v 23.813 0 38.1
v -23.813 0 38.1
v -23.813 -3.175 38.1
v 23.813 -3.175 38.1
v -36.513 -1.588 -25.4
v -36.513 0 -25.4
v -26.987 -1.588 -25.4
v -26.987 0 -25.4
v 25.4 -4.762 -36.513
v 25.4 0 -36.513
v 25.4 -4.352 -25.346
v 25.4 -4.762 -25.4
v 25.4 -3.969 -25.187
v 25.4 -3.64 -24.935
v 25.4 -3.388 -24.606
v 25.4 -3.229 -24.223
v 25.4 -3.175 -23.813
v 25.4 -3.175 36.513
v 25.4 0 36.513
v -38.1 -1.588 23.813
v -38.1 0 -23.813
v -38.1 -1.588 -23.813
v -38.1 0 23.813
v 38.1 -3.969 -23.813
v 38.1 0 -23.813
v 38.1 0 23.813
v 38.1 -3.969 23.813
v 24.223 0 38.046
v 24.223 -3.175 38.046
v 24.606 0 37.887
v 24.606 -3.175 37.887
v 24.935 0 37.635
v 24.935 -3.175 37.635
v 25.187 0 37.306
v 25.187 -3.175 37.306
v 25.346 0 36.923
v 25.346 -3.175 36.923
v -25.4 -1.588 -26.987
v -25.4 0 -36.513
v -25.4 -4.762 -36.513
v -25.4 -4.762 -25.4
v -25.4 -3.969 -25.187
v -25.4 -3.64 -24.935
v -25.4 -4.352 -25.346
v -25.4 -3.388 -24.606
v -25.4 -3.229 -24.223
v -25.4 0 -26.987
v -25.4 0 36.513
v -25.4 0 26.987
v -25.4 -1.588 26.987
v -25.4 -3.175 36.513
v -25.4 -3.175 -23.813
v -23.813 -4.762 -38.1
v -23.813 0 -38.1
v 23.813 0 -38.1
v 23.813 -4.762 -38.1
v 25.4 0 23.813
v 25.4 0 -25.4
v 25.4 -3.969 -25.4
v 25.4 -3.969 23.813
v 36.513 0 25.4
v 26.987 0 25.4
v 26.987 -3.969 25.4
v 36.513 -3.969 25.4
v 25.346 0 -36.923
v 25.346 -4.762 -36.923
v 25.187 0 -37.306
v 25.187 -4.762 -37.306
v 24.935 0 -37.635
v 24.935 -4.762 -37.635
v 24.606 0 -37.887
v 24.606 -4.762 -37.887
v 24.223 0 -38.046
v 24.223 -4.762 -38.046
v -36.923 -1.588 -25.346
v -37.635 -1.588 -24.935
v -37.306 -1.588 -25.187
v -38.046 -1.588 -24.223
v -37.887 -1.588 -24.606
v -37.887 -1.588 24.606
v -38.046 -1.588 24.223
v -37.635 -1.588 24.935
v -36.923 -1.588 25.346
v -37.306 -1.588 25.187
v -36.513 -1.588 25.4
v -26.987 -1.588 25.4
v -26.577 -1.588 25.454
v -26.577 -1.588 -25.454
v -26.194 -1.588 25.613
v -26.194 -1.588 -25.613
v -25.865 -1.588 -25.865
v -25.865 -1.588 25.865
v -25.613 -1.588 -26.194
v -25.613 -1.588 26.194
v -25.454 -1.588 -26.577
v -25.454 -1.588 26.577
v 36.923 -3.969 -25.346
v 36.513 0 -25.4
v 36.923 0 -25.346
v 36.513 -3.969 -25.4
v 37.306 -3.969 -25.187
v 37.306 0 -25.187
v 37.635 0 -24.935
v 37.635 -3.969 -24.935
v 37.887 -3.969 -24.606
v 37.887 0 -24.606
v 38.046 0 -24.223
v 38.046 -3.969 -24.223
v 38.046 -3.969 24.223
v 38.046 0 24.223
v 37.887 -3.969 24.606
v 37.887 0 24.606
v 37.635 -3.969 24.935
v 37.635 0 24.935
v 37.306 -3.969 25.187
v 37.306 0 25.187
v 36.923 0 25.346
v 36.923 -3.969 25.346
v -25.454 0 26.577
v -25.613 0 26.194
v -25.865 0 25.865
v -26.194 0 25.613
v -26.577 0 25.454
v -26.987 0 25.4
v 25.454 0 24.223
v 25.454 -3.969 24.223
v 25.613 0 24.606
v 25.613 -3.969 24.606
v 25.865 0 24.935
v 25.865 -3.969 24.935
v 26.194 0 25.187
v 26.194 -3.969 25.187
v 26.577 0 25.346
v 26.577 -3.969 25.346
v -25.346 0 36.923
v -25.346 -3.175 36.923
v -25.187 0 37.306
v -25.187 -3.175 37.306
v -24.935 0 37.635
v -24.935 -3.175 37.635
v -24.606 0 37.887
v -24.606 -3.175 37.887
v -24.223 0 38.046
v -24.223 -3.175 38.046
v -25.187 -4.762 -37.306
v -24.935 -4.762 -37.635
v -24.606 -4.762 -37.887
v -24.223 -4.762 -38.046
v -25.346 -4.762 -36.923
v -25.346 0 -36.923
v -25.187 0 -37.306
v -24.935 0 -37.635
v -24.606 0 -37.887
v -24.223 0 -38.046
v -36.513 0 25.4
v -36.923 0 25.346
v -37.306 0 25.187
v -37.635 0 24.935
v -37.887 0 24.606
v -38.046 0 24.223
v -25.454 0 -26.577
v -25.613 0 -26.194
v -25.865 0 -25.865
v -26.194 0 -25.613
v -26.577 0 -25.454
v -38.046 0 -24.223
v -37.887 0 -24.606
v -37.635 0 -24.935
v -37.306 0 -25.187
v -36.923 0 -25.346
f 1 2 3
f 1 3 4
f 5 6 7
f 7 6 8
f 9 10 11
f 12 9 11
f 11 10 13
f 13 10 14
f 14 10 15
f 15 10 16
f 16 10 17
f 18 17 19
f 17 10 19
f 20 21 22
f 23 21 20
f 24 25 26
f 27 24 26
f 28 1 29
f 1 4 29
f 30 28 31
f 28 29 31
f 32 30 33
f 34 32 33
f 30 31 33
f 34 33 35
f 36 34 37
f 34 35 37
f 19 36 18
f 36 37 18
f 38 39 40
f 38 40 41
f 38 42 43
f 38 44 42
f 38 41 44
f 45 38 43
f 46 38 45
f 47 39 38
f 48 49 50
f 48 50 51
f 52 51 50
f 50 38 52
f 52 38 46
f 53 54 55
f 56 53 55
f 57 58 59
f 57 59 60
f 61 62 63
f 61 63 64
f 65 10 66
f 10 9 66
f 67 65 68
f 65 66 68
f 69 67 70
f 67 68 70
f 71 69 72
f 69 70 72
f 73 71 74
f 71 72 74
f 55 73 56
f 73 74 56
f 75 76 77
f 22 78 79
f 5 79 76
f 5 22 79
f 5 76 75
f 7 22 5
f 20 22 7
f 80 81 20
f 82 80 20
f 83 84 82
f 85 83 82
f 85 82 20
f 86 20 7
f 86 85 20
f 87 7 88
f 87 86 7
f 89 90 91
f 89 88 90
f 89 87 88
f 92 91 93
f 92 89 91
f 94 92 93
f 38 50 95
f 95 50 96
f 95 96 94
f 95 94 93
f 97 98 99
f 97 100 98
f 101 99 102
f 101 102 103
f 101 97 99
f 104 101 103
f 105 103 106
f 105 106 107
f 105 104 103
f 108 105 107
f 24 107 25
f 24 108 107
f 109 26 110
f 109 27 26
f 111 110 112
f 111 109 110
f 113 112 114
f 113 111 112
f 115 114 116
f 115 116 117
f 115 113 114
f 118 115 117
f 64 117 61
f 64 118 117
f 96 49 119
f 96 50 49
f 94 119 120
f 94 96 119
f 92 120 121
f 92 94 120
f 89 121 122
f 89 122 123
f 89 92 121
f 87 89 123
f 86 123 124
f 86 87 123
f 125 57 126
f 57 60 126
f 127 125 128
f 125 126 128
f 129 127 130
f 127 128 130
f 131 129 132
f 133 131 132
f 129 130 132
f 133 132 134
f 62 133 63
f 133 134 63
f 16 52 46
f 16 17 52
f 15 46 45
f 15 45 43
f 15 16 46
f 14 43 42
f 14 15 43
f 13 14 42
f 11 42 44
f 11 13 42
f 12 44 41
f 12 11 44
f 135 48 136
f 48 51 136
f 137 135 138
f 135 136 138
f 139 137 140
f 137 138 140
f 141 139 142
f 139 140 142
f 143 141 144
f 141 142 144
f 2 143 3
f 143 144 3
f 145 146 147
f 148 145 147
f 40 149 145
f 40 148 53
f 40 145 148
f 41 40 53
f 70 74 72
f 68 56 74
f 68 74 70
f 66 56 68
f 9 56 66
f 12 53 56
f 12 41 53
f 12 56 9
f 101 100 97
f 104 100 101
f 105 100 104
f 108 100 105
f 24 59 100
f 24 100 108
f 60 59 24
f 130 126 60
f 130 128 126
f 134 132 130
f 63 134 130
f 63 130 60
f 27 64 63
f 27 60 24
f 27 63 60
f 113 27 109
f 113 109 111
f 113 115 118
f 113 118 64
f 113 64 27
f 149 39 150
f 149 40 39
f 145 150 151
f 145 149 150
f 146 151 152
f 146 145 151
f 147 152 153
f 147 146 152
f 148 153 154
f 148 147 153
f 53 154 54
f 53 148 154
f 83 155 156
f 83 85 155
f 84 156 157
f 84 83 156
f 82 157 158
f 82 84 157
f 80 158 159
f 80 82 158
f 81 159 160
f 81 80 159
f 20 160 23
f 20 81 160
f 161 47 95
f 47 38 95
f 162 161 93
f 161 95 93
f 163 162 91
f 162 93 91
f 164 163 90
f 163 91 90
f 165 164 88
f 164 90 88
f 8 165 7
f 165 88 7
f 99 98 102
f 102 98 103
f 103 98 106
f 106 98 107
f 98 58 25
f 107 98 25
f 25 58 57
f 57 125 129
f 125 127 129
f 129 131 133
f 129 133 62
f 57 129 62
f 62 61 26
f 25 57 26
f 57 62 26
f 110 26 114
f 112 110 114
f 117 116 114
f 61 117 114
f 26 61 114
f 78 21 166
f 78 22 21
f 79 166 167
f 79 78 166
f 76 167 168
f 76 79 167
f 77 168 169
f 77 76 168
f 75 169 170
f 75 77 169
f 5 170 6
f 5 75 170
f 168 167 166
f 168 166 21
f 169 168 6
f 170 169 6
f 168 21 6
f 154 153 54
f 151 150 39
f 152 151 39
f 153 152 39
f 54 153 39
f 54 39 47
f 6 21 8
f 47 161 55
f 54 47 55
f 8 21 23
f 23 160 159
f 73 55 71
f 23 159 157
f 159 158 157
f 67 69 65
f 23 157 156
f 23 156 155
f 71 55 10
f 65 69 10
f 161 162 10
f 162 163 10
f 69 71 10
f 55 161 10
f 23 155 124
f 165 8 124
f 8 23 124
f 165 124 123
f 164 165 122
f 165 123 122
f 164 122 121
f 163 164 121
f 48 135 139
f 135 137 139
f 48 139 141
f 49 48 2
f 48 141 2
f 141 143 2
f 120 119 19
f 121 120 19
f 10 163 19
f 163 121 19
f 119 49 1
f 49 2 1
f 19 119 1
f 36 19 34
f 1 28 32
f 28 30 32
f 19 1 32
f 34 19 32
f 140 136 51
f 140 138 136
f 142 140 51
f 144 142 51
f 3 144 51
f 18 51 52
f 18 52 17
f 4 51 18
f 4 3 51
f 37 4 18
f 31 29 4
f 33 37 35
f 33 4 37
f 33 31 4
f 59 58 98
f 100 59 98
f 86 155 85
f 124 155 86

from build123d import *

# Parameters (mm, degrees)
F0_W     = 50.8
F0_H     = 12.7
F1_DEPTH = 3.175
F0_W_2   = 12.7
F0_H_2   = 50.8
F2_DEPTH = 3.96875
F3_DEPTH = 4.7625
F4_DEPTH = 1.5875
F5_DEPTH = 3.175
F6_R     = 1.58749
F6_2_R   = 1.58749


# Not quite as in the source:
# - a fillet or chamfer is up to 0.001 mm smaller than in the source, because OpenCascade refuses the exact size


with BuildPart() as f1:
    # F0 (on Front) → F1 (new body)
    with BuildSketch(Plane.XZ):
        with Locations((0, 31.75)):
            Rectangle(F0_W, F0_H)
    extrude(amount=F1_DEPTH)



with BuildPart() as f2:
    # F0 (on Front) → F2 (new body)
    with BuildSketch(Plane.XZ):
        with Locations((31.75, 0)):
            Rectangle(F0_W_2, F0_H_2)
    extrude(amount=F2_DEPTH)

    # F6#2 (radius 1.5875 in the source; OpenCascade refuses exactly that, so slightly less here)
    f6_2_edges = [f2.edges().sort_by_distance(p)[0] for p in [
        (38.1, -1.984375, -25.4),
        (25.4, -1.984375, 25.4),
        (38.1, -1.984375, 25.4),
    ]]
    fillet(f6_2_edges, radius=F6_2_R)


with BuildPart() as f3:
    # F0 (on Front) → F3 (new body)
    with BuildSketch(Plane.XZ):
        with Locations((0, -31.75)):
            Rectangle(F0_W, F0_H)
    extrude(amount=F3_DEPTH)


with BuildPart() as f1_1:
    add(f1.part)

    add(f3.part)  # F4 merges F3
    # F0 (on Front) → F4 (join)
    with BuildSketch(Plane.XZ):
        with Locations((-31.75, 0)):
            Rectangle(F0_W_2, F0_H_2)
    extrude(amount=F4_DEPTH)

    # F0 (on Front) → F5 (join)
    with BuildSketch(Plane.XZ):
        Rectangle(F0_W, F0_H_2)
    extrude(amount=F5_DEPTH)

    # F6 (radius 1.5875 in the source; OpenCascade refuses exactly that, so slightly less here)
    f6_edges = [f1_1.edges().sort_by_distance(p)[0] for p in [
        (-25.4, -2.38125, -38.1),
        (25.4, -2.38125, -38.1),
        (-38.1, -0.79375, -25.4),
        (-38.1, -0.79375, 25.4),
        (-25.4, -0.79375, 25.4),
        (-25.4, -1.5875, 38.1),
        (25.4, -1.5875, 38.1),
        (-25.4, -0.79375, -25.4),
        (0, -3.175, -25.4),
    ]]
    fillet(f6_edges, radius=F6_R)


solid = Compound([f2.part, f1_1.part])
